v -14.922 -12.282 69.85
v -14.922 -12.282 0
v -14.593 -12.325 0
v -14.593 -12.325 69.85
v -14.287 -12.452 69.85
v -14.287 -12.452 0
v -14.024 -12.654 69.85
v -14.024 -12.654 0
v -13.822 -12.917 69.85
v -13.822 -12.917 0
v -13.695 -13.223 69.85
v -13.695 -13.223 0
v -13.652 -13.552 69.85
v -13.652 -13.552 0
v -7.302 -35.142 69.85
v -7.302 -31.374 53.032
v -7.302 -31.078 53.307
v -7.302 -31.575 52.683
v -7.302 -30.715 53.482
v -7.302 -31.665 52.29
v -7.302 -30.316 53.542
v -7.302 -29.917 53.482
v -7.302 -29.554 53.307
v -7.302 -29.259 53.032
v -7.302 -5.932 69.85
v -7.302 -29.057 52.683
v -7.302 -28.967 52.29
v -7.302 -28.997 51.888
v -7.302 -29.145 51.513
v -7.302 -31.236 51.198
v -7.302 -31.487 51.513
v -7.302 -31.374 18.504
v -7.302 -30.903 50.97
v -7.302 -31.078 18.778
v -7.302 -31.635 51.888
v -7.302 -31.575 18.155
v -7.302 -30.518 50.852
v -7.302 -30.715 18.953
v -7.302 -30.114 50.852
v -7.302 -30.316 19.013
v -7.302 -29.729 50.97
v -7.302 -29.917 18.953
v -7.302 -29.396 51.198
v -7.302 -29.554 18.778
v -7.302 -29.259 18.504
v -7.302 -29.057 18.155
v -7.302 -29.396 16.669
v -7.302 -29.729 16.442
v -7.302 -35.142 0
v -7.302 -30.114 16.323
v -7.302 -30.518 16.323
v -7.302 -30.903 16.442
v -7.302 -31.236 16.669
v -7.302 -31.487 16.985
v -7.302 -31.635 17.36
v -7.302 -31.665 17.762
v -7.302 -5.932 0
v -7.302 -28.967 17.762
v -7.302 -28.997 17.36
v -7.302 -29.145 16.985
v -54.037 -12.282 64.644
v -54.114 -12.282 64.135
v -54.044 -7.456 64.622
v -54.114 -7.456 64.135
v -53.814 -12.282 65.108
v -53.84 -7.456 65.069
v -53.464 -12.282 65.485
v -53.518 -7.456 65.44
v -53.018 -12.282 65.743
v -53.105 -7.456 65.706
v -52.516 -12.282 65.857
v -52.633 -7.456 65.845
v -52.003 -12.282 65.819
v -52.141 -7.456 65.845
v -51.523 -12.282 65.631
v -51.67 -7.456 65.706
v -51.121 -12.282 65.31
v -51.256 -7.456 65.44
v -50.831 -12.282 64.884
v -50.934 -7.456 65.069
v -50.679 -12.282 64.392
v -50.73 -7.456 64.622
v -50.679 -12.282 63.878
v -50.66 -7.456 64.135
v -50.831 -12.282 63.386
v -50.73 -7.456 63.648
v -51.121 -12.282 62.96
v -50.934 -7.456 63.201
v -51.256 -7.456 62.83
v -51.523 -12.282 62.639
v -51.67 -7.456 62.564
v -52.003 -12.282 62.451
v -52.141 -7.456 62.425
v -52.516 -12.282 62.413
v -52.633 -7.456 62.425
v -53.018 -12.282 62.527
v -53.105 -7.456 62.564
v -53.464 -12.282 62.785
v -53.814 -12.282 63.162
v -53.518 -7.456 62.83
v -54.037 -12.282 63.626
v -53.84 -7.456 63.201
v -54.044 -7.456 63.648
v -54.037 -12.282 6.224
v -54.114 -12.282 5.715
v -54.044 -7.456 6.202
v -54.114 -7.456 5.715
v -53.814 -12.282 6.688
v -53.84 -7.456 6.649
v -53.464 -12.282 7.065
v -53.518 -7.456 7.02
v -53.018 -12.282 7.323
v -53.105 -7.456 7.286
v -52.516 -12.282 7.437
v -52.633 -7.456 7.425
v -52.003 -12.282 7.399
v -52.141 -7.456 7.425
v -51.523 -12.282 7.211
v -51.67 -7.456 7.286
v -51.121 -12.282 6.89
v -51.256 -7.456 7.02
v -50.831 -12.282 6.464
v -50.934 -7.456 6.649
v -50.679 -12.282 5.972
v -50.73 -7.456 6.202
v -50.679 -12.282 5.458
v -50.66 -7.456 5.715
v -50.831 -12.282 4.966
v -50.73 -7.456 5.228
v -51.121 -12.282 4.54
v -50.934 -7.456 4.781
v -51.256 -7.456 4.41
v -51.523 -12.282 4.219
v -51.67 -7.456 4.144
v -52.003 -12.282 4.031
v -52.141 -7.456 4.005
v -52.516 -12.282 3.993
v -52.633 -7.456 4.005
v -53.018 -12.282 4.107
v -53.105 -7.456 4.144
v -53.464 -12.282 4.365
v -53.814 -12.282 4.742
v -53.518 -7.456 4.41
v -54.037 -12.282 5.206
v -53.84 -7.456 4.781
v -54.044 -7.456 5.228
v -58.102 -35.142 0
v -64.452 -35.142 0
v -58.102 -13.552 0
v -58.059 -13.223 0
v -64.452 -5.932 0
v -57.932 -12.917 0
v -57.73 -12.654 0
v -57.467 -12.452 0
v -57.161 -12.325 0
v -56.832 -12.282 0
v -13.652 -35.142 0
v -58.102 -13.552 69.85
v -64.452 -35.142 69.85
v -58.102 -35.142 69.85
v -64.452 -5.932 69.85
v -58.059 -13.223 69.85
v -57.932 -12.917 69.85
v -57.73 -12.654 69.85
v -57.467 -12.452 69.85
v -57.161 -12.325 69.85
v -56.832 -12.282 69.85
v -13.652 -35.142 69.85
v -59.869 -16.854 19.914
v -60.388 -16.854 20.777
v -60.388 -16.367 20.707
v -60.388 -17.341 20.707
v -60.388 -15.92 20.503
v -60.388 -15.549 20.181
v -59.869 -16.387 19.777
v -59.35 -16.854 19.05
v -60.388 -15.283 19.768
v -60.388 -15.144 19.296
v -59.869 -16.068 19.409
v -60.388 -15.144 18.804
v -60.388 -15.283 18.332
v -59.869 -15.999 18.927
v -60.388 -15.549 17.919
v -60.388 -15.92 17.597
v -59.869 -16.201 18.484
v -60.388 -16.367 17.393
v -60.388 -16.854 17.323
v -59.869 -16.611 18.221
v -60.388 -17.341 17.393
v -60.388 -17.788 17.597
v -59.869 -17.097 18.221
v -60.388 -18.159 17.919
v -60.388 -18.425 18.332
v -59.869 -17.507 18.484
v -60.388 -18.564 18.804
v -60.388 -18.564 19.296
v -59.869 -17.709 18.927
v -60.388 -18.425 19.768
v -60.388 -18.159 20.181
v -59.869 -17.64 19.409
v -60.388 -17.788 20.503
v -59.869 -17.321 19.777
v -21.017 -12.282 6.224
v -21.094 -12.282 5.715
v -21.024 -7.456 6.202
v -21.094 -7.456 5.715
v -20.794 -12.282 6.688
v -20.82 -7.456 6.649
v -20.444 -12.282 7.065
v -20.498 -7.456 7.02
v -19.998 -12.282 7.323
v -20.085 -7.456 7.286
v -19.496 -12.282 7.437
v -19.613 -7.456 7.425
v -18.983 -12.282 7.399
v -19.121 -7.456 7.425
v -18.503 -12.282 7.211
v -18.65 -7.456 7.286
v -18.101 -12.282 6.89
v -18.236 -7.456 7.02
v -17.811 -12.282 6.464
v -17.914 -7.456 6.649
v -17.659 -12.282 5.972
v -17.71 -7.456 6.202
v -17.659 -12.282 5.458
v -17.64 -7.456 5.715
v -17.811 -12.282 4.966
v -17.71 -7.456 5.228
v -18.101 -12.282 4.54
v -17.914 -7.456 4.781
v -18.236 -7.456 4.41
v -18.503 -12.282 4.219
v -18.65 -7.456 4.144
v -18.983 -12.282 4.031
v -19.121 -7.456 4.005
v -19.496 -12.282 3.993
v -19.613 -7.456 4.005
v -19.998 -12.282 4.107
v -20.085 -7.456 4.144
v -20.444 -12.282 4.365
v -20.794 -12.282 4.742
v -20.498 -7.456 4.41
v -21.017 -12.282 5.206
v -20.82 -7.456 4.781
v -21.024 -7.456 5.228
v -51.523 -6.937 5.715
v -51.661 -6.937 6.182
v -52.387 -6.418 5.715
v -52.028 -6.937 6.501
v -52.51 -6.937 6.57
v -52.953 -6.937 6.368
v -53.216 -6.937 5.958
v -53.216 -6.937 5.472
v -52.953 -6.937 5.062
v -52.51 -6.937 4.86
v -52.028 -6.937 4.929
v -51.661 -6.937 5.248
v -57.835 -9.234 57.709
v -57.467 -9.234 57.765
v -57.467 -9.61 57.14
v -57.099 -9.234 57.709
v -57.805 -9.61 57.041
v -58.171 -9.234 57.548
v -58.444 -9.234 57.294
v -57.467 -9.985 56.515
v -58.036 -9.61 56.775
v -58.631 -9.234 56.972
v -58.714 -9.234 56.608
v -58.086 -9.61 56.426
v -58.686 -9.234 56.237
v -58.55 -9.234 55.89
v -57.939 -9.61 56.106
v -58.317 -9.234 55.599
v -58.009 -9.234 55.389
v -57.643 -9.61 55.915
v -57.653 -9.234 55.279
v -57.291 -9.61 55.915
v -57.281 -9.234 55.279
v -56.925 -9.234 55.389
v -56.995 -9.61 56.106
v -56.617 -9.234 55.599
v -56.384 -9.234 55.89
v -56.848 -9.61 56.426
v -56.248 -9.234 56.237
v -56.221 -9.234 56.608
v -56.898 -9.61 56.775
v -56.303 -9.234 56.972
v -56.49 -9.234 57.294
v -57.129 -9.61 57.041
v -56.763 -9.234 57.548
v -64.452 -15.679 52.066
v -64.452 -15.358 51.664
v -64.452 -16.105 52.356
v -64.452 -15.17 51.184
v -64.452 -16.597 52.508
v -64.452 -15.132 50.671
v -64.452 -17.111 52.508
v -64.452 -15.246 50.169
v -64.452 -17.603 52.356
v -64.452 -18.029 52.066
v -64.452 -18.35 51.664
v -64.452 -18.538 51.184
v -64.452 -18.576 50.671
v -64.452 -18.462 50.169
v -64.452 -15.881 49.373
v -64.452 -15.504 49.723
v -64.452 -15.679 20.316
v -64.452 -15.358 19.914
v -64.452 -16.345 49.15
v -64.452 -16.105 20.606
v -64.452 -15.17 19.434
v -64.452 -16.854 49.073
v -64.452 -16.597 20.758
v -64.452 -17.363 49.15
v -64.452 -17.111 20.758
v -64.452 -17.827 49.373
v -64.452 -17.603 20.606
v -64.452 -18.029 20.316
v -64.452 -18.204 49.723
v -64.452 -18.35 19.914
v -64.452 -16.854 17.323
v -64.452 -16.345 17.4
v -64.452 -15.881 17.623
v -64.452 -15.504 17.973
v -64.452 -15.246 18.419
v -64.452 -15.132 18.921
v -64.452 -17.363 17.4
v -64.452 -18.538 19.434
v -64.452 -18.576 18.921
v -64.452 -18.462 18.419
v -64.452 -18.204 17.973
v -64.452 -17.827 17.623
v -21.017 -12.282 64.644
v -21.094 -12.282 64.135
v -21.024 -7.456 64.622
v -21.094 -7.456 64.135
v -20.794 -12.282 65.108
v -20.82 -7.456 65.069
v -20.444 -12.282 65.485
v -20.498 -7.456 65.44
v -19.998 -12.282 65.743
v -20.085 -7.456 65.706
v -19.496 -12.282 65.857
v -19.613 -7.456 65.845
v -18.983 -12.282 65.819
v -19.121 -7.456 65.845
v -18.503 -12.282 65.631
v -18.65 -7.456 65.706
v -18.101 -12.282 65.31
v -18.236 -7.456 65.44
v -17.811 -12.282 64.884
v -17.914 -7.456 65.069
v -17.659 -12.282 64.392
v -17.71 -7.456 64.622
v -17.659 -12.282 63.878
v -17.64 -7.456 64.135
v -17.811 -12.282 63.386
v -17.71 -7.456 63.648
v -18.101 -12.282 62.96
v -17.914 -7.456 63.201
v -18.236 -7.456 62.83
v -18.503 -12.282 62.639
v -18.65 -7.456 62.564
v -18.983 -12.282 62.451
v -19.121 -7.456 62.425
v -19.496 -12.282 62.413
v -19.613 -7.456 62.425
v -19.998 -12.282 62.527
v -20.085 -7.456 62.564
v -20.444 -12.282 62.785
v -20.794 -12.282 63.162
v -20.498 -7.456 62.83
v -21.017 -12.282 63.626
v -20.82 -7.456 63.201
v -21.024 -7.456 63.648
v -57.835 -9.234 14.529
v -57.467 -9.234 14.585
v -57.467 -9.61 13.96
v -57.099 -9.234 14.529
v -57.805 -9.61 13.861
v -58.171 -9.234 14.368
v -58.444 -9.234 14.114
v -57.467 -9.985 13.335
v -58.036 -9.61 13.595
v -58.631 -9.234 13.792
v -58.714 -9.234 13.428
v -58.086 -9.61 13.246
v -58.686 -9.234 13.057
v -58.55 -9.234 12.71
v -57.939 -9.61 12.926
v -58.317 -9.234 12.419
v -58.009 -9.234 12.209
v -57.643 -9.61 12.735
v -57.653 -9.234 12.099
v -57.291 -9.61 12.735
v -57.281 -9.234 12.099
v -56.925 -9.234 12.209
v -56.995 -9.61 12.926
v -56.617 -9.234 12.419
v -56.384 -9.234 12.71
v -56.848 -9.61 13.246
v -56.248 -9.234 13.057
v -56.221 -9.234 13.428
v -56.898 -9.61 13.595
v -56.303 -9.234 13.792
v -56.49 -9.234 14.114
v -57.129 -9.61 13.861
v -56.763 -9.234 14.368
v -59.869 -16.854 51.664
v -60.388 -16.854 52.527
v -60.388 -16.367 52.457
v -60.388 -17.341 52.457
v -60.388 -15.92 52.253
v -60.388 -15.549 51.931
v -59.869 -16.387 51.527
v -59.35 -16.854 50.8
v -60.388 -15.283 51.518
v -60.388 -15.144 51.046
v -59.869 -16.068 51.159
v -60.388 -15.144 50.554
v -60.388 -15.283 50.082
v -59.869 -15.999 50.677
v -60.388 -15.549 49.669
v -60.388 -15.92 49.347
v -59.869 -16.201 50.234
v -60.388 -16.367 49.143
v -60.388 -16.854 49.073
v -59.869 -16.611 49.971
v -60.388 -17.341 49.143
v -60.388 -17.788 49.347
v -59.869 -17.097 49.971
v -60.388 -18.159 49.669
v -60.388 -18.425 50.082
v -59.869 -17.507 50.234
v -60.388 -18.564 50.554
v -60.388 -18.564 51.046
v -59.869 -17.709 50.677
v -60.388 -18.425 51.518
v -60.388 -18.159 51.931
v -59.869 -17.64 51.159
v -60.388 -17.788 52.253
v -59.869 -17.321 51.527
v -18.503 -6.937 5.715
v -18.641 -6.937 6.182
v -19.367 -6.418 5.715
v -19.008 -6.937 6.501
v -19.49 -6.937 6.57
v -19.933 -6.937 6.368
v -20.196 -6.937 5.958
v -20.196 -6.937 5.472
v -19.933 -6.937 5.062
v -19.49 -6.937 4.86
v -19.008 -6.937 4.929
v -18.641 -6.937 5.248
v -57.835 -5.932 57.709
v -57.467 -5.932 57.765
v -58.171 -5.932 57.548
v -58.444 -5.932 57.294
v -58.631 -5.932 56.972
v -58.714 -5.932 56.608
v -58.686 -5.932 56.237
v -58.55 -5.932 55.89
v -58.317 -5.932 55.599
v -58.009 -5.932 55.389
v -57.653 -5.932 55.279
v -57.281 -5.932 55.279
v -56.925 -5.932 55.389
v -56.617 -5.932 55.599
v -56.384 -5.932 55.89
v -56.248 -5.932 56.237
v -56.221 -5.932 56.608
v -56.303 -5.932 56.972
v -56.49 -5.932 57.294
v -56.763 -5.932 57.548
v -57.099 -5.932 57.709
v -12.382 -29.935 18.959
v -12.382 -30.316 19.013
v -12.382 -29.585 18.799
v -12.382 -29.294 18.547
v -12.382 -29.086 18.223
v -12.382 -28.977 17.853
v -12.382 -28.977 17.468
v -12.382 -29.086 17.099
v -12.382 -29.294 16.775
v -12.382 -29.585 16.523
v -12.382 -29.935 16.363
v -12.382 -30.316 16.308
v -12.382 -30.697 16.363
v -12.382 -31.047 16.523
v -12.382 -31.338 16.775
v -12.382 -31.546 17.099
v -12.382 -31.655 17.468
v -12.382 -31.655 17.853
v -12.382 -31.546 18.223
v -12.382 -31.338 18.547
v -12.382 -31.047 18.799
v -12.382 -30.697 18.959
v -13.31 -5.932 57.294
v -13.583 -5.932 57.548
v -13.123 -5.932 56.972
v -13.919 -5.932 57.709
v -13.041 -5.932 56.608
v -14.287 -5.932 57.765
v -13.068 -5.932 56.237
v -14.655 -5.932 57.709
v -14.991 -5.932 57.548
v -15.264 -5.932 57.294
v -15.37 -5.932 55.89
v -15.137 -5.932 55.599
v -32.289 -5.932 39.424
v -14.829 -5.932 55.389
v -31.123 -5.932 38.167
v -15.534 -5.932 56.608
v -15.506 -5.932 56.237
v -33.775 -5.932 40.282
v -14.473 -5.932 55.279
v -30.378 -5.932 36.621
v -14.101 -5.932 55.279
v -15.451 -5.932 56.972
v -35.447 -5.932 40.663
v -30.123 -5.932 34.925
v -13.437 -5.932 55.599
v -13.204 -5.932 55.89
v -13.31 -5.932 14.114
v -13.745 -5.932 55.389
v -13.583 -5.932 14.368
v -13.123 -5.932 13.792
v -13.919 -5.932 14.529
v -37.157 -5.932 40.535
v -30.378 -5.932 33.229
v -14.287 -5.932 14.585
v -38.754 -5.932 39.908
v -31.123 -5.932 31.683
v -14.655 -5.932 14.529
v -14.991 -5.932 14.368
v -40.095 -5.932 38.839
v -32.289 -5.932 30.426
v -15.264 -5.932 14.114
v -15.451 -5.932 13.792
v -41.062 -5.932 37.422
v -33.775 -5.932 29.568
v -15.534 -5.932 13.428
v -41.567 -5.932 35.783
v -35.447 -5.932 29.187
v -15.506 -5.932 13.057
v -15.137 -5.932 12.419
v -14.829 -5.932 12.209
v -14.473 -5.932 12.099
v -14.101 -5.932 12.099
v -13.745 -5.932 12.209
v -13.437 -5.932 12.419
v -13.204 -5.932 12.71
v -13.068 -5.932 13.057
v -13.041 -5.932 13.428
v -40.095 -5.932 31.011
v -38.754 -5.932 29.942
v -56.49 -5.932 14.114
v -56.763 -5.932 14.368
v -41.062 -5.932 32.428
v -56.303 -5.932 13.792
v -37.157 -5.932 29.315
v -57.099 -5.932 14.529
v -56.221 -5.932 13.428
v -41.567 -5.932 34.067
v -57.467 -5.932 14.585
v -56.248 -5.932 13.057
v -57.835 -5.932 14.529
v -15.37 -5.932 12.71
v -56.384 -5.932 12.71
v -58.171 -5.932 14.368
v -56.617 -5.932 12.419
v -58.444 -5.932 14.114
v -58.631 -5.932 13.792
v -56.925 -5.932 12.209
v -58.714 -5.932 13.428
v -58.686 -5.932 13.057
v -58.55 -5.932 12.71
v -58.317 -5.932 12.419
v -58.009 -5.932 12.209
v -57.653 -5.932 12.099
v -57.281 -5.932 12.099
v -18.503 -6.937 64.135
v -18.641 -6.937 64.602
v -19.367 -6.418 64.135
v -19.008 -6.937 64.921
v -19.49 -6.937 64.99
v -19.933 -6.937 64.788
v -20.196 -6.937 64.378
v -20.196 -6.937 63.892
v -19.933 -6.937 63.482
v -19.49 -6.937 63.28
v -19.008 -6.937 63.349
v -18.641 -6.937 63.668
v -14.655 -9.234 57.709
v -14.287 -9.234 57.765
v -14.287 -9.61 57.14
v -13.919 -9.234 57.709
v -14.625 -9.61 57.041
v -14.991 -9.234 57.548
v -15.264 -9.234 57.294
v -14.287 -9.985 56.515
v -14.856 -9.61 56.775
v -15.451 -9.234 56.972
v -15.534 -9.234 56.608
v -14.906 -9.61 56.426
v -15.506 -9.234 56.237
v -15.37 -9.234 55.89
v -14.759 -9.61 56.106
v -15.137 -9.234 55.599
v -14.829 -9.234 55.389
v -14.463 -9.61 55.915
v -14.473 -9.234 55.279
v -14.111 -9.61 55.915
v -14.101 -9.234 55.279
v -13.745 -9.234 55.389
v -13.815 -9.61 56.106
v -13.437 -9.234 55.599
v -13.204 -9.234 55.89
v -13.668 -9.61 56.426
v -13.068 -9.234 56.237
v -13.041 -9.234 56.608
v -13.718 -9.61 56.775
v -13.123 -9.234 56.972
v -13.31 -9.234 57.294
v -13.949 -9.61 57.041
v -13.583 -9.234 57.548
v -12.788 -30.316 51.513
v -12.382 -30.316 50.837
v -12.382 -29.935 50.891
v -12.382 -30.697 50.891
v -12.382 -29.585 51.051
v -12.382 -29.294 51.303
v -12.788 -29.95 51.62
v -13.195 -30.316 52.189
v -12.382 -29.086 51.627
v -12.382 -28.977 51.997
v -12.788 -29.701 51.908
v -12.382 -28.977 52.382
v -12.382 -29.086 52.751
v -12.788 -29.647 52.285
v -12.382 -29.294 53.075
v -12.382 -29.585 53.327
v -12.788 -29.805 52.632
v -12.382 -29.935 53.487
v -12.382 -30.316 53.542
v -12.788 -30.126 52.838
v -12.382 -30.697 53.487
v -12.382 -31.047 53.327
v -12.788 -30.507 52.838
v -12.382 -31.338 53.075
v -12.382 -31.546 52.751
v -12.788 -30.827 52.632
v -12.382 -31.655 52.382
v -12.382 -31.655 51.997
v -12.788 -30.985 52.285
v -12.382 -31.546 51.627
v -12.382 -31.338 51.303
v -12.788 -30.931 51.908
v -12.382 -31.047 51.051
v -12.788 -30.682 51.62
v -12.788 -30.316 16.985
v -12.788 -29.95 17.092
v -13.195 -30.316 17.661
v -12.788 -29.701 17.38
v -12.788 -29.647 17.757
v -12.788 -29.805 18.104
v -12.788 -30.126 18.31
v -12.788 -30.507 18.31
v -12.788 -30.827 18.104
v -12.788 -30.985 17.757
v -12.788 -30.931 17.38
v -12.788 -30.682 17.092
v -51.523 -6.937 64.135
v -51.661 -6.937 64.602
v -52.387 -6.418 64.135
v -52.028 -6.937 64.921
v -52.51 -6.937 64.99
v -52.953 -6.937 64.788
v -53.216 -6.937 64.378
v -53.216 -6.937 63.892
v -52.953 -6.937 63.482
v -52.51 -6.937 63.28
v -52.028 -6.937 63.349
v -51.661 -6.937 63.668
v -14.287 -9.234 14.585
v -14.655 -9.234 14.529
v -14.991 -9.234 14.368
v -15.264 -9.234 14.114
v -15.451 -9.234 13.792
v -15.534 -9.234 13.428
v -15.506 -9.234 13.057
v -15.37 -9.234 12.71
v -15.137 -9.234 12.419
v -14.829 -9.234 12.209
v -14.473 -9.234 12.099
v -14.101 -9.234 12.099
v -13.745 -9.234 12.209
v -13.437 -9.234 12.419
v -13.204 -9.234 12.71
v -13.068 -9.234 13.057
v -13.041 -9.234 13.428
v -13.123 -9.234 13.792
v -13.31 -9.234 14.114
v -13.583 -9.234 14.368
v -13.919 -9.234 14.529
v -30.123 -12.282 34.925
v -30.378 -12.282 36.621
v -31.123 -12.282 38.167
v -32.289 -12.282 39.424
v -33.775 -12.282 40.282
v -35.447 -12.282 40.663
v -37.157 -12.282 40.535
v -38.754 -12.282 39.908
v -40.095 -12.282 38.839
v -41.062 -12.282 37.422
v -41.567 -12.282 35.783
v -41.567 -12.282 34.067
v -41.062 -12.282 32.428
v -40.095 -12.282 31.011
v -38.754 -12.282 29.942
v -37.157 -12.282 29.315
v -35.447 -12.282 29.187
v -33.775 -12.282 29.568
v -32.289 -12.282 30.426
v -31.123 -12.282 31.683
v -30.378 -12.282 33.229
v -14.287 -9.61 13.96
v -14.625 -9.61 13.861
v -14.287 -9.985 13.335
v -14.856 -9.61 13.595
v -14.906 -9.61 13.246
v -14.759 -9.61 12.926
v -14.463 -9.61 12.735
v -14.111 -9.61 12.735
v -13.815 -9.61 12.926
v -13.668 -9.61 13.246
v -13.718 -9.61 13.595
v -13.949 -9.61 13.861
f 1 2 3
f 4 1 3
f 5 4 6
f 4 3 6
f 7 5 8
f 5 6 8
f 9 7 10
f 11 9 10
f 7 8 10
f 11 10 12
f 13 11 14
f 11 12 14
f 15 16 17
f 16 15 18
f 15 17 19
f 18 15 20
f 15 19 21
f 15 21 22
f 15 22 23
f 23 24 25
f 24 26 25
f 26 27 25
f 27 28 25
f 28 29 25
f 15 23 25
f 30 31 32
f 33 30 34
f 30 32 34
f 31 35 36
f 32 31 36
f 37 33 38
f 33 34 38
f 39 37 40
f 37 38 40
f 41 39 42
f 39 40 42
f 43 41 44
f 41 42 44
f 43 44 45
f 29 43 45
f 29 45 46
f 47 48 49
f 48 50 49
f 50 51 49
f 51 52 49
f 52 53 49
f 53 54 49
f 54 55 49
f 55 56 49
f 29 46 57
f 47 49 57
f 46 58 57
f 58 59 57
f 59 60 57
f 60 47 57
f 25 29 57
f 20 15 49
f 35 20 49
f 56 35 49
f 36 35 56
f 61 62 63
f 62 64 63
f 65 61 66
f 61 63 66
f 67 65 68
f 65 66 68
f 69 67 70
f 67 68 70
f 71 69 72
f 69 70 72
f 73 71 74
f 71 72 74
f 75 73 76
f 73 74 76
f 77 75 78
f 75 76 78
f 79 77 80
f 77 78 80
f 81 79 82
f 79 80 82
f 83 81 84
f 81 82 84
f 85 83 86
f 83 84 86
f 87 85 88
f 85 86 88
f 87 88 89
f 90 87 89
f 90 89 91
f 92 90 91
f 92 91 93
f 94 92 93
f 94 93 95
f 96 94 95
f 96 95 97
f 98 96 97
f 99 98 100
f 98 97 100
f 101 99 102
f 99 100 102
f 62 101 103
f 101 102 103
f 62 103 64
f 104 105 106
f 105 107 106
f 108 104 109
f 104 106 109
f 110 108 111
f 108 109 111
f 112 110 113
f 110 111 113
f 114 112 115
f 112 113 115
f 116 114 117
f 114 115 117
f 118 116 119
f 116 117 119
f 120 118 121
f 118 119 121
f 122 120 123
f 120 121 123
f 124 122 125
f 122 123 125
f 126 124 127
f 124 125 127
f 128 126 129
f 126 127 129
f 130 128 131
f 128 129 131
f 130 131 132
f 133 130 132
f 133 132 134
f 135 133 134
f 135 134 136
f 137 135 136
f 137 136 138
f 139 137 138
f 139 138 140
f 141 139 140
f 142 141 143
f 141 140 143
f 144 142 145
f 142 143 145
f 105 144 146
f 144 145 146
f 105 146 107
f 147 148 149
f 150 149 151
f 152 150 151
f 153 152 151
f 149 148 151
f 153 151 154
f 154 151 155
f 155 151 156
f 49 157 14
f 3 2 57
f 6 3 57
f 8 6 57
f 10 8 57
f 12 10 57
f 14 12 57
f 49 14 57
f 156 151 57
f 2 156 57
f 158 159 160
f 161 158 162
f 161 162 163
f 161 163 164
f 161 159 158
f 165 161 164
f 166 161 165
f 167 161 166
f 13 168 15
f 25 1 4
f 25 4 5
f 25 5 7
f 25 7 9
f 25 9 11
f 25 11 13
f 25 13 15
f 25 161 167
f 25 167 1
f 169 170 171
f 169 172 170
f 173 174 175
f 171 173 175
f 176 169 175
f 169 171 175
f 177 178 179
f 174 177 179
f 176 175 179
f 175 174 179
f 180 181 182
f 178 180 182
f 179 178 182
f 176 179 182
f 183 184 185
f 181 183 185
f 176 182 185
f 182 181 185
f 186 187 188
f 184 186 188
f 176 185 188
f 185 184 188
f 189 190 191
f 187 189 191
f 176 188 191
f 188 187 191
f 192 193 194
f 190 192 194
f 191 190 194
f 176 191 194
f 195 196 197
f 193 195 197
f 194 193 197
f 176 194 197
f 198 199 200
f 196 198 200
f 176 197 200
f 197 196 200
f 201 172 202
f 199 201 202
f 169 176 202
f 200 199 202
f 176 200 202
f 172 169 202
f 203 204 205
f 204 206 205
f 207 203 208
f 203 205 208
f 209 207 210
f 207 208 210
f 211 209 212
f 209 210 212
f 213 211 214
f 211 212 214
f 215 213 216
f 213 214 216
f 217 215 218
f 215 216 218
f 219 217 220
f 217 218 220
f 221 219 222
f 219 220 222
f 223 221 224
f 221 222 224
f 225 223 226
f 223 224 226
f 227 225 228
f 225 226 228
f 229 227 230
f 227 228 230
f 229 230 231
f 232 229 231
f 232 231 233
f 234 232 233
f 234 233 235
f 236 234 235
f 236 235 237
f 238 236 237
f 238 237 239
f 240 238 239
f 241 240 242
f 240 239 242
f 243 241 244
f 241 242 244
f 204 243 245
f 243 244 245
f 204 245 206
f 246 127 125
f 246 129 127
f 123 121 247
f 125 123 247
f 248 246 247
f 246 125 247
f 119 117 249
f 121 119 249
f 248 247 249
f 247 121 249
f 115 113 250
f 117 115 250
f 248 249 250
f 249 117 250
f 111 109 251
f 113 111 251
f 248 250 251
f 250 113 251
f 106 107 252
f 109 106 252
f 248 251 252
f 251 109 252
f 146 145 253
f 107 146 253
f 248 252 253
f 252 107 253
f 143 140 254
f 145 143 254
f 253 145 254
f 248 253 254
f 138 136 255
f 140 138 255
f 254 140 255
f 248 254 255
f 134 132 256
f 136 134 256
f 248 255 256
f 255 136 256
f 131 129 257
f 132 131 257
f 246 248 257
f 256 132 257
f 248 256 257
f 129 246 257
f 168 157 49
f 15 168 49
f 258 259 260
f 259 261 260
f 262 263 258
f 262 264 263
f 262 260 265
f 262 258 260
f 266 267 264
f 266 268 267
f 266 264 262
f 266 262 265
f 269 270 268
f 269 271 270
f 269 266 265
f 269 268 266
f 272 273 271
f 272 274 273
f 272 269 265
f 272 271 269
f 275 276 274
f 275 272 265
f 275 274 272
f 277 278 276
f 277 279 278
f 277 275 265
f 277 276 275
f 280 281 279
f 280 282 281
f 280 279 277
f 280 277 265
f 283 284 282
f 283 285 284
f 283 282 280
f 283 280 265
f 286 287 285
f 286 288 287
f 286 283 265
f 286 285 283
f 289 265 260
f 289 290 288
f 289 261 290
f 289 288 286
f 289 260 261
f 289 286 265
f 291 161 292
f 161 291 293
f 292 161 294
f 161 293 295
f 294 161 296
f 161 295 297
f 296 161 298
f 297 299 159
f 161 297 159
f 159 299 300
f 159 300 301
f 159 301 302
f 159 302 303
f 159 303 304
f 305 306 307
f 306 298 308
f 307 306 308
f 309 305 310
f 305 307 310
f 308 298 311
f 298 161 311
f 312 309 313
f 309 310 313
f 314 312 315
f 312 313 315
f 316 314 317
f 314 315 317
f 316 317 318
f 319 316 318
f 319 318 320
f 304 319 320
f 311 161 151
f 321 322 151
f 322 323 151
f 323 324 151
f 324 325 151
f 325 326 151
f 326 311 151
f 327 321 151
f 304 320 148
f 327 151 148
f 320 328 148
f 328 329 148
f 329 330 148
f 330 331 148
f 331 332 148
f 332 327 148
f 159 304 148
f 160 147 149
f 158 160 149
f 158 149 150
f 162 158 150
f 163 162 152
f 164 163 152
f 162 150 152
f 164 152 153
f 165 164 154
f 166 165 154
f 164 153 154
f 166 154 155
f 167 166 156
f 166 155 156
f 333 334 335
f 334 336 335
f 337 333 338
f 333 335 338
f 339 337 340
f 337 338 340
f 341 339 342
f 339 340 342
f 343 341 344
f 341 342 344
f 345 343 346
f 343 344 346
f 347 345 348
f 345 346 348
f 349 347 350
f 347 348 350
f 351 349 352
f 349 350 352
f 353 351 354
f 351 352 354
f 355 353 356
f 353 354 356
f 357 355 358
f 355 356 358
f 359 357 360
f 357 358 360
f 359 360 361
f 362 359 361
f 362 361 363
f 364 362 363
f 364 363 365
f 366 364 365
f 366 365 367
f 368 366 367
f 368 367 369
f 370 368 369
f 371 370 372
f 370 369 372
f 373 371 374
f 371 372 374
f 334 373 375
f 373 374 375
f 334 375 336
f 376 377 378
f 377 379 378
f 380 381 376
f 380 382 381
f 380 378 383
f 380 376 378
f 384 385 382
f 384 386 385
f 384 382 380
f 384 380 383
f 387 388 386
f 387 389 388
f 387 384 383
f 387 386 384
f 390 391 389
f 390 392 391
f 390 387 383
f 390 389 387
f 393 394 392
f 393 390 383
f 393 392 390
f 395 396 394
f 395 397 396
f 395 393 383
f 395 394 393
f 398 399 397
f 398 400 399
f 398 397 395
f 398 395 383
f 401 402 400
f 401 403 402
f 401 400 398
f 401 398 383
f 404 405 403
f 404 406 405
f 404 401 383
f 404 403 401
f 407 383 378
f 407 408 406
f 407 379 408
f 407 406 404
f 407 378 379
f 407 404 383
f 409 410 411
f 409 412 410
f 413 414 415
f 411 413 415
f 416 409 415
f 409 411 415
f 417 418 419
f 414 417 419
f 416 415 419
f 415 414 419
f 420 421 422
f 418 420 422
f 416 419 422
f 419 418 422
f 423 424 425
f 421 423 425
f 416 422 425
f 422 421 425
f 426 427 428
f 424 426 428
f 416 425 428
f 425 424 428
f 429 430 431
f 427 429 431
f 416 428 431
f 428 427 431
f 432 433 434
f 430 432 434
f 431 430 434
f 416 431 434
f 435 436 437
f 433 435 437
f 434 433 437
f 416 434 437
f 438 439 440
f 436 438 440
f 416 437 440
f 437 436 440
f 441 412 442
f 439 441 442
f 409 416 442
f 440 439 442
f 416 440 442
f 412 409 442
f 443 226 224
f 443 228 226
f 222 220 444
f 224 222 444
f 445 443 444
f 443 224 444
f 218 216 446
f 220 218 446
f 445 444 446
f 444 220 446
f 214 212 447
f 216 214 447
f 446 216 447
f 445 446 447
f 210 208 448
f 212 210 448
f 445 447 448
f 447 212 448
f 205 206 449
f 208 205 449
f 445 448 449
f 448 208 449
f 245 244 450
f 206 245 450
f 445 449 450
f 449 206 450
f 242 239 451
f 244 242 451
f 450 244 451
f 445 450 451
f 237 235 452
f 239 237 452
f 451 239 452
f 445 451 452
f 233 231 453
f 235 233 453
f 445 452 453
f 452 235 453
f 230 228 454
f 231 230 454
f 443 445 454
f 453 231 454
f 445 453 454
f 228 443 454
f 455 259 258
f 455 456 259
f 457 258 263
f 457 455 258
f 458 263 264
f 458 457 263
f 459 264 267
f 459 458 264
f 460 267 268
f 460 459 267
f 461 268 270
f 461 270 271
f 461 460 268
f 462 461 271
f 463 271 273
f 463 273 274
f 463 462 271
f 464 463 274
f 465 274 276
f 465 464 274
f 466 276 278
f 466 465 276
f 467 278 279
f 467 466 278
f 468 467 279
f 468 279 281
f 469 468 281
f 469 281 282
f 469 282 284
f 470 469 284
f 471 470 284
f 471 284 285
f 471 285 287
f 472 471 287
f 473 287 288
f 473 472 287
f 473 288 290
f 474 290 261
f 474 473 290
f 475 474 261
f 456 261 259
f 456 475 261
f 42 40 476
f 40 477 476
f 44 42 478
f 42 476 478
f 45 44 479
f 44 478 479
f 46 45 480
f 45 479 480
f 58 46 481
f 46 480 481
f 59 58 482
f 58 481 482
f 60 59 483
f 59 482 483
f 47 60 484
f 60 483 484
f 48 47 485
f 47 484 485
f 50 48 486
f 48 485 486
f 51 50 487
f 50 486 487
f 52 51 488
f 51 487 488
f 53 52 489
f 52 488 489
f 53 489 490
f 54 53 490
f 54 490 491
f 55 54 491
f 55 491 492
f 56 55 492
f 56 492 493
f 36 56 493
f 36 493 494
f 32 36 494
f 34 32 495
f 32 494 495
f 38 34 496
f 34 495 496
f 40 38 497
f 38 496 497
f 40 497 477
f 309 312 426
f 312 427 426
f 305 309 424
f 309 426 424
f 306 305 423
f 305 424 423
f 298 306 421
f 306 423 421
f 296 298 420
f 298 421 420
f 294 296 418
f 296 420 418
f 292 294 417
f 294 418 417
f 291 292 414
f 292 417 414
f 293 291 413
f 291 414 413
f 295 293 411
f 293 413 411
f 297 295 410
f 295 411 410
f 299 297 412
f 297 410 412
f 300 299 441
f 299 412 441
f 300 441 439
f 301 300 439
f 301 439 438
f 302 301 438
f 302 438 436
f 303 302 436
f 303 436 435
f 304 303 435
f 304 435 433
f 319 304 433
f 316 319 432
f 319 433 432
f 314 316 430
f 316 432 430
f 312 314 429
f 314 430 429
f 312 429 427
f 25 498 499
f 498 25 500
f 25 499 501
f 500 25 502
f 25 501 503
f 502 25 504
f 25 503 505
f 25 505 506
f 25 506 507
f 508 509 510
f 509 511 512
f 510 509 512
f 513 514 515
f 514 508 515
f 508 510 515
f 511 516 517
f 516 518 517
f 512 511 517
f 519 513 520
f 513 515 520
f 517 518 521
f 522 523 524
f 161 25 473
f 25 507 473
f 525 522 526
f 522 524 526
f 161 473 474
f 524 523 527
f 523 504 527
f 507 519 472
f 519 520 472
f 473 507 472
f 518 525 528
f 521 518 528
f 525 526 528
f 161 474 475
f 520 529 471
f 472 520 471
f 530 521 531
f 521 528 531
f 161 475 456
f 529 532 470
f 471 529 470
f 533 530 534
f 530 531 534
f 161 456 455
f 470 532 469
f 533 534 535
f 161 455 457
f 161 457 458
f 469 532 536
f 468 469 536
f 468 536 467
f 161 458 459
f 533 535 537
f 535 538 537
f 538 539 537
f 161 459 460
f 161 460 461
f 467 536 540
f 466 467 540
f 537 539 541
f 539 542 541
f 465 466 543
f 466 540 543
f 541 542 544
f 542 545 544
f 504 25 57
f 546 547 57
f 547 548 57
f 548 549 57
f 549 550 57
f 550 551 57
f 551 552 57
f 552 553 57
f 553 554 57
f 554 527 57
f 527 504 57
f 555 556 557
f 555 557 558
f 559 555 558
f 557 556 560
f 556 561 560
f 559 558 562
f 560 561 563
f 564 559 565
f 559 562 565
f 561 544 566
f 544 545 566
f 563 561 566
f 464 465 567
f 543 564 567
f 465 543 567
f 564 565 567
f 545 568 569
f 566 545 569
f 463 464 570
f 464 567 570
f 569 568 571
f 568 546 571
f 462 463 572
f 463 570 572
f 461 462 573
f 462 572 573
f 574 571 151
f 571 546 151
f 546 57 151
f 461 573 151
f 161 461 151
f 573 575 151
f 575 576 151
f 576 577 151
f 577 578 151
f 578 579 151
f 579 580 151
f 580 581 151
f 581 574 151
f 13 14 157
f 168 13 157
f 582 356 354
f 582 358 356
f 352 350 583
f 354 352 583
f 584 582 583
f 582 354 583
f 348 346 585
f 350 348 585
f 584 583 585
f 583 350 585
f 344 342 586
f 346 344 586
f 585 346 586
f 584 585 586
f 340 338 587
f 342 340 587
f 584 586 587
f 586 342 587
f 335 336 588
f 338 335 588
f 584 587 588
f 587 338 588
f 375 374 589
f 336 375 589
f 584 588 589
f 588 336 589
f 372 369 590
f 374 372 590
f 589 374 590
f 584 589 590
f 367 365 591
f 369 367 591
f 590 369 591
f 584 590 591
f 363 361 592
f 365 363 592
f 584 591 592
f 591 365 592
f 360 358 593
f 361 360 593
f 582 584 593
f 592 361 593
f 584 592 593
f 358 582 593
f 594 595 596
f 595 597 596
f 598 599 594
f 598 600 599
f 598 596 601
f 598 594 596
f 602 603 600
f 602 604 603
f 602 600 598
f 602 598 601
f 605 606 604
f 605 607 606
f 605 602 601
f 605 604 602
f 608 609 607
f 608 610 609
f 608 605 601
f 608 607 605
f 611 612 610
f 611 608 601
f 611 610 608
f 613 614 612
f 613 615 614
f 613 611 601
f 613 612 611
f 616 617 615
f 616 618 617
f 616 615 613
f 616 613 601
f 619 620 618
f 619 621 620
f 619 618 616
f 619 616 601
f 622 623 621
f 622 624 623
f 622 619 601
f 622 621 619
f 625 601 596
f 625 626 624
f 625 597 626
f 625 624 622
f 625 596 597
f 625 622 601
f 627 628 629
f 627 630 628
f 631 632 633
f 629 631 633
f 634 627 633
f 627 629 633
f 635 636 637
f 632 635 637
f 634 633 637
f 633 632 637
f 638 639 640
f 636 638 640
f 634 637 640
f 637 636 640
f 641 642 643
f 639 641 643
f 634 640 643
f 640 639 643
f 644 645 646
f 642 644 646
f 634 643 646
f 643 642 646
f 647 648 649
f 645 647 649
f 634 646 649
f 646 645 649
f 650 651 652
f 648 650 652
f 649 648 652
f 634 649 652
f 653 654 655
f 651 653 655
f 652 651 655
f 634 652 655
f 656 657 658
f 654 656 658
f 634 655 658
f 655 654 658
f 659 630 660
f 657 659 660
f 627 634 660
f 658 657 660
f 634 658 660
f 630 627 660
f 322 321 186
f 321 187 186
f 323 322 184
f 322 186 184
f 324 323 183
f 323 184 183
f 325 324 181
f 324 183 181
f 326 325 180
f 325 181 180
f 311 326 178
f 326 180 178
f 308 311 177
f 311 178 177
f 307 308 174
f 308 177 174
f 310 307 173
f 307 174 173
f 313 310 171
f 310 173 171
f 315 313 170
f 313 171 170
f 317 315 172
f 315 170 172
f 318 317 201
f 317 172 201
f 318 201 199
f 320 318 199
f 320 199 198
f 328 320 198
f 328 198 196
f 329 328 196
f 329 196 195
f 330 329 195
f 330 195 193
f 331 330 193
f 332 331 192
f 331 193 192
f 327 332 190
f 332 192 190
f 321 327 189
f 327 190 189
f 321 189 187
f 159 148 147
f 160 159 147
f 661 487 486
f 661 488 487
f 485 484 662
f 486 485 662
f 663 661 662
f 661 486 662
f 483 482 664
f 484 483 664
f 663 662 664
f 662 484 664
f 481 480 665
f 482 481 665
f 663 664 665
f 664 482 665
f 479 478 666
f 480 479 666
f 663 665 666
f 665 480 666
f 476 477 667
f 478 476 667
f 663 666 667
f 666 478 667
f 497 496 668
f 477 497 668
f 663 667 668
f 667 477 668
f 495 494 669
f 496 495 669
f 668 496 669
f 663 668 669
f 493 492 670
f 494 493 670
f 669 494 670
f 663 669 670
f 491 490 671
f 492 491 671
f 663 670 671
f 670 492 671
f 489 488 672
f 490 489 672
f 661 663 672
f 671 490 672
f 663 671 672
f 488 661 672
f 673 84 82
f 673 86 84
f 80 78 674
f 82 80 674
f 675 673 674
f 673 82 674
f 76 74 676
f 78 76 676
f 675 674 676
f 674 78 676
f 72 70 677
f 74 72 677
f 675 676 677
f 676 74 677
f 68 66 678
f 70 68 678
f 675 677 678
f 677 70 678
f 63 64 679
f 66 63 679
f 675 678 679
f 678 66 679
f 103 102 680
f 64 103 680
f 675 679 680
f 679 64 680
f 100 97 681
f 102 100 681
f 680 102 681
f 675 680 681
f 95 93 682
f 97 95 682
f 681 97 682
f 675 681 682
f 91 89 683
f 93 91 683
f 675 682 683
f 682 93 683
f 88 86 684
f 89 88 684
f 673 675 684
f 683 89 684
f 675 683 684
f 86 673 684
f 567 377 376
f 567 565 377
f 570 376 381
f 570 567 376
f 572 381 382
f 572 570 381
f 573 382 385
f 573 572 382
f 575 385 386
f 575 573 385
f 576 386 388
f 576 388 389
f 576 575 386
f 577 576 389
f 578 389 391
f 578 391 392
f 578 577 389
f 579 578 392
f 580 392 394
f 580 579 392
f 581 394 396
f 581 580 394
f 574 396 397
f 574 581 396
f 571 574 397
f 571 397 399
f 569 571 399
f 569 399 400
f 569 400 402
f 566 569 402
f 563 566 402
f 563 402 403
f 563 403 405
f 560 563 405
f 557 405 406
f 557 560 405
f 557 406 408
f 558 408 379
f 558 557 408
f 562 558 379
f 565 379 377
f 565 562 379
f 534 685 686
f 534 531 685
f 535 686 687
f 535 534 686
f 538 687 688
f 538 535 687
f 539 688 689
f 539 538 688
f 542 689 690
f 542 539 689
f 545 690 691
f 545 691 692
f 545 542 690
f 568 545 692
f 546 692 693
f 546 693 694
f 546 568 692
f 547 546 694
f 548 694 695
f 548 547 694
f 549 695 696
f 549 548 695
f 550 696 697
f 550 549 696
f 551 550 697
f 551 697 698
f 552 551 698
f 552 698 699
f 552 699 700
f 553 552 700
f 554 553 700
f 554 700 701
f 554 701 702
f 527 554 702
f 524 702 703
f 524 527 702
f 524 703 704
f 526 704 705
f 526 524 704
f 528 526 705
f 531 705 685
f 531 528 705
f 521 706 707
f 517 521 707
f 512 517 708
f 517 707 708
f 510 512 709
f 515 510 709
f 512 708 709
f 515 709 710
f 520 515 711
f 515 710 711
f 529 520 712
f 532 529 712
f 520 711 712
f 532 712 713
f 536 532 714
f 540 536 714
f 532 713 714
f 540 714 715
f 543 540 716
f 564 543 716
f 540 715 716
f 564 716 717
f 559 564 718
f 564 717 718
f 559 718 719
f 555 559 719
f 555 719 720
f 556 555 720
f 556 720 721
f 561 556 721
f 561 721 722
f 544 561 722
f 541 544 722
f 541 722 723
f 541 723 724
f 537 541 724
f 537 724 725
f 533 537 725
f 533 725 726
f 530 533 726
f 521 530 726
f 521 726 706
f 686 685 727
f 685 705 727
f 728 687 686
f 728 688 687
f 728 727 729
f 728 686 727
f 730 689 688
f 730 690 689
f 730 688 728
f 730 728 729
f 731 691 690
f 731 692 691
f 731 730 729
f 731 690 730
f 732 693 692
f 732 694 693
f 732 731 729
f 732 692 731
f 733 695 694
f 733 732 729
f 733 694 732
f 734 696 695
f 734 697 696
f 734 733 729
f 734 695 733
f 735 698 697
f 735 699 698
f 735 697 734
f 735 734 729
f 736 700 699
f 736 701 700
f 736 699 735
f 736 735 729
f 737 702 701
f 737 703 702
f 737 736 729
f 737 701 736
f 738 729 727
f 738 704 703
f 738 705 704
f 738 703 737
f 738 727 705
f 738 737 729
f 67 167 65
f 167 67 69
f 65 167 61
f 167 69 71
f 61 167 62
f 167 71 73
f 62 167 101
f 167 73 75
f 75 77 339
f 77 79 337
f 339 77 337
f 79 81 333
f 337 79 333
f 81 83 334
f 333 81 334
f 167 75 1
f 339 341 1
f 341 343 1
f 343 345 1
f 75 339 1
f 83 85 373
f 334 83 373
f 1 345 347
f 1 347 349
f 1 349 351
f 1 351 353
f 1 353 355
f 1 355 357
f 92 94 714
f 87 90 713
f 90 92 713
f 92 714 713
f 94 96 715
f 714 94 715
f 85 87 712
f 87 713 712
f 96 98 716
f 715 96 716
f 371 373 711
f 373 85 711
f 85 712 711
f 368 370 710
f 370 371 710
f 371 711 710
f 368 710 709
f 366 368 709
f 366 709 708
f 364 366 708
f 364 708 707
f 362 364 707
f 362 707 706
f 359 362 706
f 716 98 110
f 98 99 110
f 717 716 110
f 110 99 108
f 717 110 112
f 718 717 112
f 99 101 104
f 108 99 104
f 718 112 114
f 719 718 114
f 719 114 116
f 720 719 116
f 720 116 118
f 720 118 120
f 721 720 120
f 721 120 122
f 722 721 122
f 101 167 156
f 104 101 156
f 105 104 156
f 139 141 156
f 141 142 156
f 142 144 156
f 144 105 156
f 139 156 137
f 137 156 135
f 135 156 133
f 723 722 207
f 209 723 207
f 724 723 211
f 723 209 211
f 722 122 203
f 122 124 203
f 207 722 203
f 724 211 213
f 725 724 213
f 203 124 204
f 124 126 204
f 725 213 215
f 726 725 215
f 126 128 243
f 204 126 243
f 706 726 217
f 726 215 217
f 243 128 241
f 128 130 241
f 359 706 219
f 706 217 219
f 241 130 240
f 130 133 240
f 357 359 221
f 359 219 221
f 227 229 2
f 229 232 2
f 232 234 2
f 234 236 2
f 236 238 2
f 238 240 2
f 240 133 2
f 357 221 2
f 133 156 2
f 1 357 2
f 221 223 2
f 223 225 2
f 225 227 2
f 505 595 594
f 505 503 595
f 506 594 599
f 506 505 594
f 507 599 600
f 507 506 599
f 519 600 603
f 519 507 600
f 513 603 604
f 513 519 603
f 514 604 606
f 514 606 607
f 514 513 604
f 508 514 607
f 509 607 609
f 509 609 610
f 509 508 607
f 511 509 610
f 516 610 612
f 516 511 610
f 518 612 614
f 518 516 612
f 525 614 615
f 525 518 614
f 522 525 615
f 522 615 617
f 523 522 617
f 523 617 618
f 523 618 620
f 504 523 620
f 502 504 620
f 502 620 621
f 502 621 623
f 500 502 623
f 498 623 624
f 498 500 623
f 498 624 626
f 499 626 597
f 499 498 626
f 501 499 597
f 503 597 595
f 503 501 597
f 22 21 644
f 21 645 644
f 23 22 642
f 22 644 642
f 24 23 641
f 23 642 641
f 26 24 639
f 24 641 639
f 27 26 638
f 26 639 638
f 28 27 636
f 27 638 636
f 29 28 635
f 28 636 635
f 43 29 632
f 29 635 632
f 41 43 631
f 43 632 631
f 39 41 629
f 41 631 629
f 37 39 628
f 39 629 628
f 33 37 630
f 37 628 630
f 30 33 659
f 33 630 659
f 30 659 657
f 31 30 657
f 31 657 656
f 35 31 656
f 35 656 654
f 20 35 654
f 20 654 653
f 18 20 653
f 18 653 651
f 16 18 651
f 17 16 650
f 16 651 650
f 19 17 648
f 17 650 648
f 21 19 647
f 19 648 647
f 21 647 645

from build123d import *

# Parameters (mm, degrees)
BOSS_EXTRUDE1_DEPTH             = 69.85
TAP_DRILL_FOR_1_2_20_TAP1_D     = 11.50874
TAP_DRILL_FOR_1_2_20_TAP1_DEPTH = 12.7
TAP_DRILL_FOR_1_2_20_TAP1_TIP   = 3.45757432
LPATTERN2_COUNT                 = 2
LPATTERN2_PITCH                 = 43.18
LPATTERN2_COUNT_DIR2            = 2
LPATTERN2_PITCH_DIR2            = 43.18
TAP_DRILL_FOR_8_32_TAP1_D       = 3.4544
TAP_DRILL_FOR_8_32_TAP1_DEPTH   = 4.826
TAP_DRILL_FOR_8_32_TAP1_TIP     = 1.037806461
TAP_DRILL_FOR_8_32_TAP4_D       = 3.4544
TAP_DRILL_FOR_8_32_TAP4_DEPTH   = 4.064
TAP_DRILL_FOR_8_32_TAP4_TIP     = 1.037806461
TAP_DRILL_FOR_6_32_TAP1_D       = 2.7051
TAP_DRILL_FOR_6_32_TAP1_DEPTH   = 5.08
TAP_DRILL_FOR_6_32_TAP1_TIP     = 0.81269403


with BuildPart() as part:
    # Sketch1 → Boss-Extrude1 (new body)
    with BuildSketch(Plane.XY):
        with BuildLine():
            Line((-64.452009828, -5.932047122), (-64.452009828, -35.142047122))
            Line((-64.452009828, -35.142047122), (-58.102009828, -35.142047122))
            Line((-58.102009828, -35.142047122), (-58.102009828, -13.552047122))
            ThreePointArc((-58.102009828, -13.552047122), (-57.73003544, -12.65402151), (-56.832009828, -12.282047122))
            Line((-56.832009828, -12.282047122), (-14.922009828, -12.282047122))
            ThreePointArc((-14.922009828, -12.282047122), (-14.023984216, -12.65402151), (-13.652009828, -13.552047122))
            Line((-13.652009828, -13.552047122), (-13.652009828, -35.142047122))
            Line((-13.652009828, -35.142047122), (-7.302009828, -35.142047122))
            Line((-7.302009828, -35.142047122), (-7.302009828, -5.932047122))
            Line((-7.302009828, -5.932047122), (-64.452009828, -5.932047122))
        make_face()
    extrude(amount=BOSS_EXTRUDE1_DEPTH)

    # Tap Drill for 1/2-20 Tap1
    with Locations(Plane(origin=(0, -5.932047122, 0), x_dir=(-1, 0, 0), z_dir=(0, 1, 0))):
        with Locations((35.877009828, 34.925)):
            Hole(TAP_DRILL_FOR_1_2_20_TAP1_D / 2, depth=TAP_DRILL_FOR_1_2_20_TAP1_DEPTH)
            with Locations((0, 0, -(TAP_DRILL_FOR_1_2_20_TAP1_DEPTH + TAP_DRILL_FOR_1_2_20_TAP1_TIP / 2))):  # 118° drill point
                Cone(0, TAP_DRILL_FOR_1_2_20_TAP1_D / 2, TAP_DRILL_FOR_1_2_20_TAP1_TIP, mode=Mode.SUBTRACT)

    # Sketch10 → Tap Drill for M3x0.5 Tap1 (revolve, cut)
    with BuildSketch(Plane(origin=(-57.467009828, -5.932047122, 13.335), x_dir=(0, 0, 1), z_dir=(1, 0, 0))):
        Polygon((0, 0), (0, 4.053075774), (1.25, 3.302), (1.25, 0), align=None)
    tap_drill_for_m3x0_5_tap1 = revolve(axis=Axis((-57.467009828, 0.417952878, 13.335), (0, -1, 0)), mode=Mode.SUBTRACT)

    # LPattern2: Tap Drill for M3x0.5 Tap1 2 × 2
    with Locations(*[(i * LPATTERN2_PITCH, 0, j * LPATTERN2_PITCH_DIR2) for i in range(LPATTERN2_COUNT) for j in range(LPATTERN2_COUNT_DIR2) if (i, j) != (0, 0)]):
        add(tap_drill_for_m3x0_5_tap1, mode=Mode.SUBTRACT)

    # Tap Drill for #8-32 Tap1
    with Locations(Plane.XZ.offset(12.282047122)):
        with Locations((-52.387009828, 64.135), (-19.367009828, 64.135), (-52.387009828, 5.715), (-19.367009828, 5.715)):
            Hole(TAP_DRILL_FOR_8_32_TAP1_D / 2, depth=TAP_DRILL_FOR_8_32_TAP1_DEPTH)
            with Locations((0, 0, -(TAP_DRILL_FOR_8_32_TAP1_DEPTH + TAP_DRILL_FOR_8_32_TAP1_TIP / 2))):  # 118° drill point
                Cone(0, TAP_DRILL_FOR_8_32_TAP1_D / 2, TAP_DRILL_FOR_8_32_TAP1_TIP, mode=Mode.SUBTRACT)

    # Tap Drill for #8-32 Tap4
    with Locations(Plane.ZY.offset(64.452009828)):
        with Locations((19.05, -16.854047122), (50.8, -16.854047122)):
            Hole(TAP_DRILL_FOR_8_32_TAP4_D / 2, depth=TAP_DRILL_FOR_8_32_TAP4_DEPTH)
            with Locations((0, 0, -(TAP_DRILL_FOR_8_32_TAP4_DEPTH + TAP_DRILL_FOR_8_32_TAP4_TIP / 2))):  # 118° drill point
                Cone(0, TAP_DRILL_FOR_8_32_TAP4_D / 2, TAP_DRILL_FOR_8_32_TAP4_TIP, mode=Mode.SUBTRACT)

    # Tap Drill for #6-32 Tap1
    with Locations(Plane(origin=(-7.302009828, 0, 0), x_dir=(0, 0, -1), z_dir=(1, 0, 0))):
        with Locations((-52.1890625, -30.316047122), (-17.6609375, -30.316047122)):
            Hole(TAP_DRILL_FOR_6_32_TAP1_D / 2, depth=TAP_DRILL_FOR_6_32_TAP1_DEPTH)
            with Locations((0, 0, -(TAP_DRILL_FOR_6_32_TAP1_DEPTH + TAP_DRILL_FOR_6_32_TAP1_TIP / 2))):  # 118° drill point
                Cone(0, TAP_DRILL_FOR_6_32_TAP1_D / 2, TAP_DRILL_FOR_6_32_TAP1_TIP, mode=Mode.SUBTRACT)


solid = part.part
